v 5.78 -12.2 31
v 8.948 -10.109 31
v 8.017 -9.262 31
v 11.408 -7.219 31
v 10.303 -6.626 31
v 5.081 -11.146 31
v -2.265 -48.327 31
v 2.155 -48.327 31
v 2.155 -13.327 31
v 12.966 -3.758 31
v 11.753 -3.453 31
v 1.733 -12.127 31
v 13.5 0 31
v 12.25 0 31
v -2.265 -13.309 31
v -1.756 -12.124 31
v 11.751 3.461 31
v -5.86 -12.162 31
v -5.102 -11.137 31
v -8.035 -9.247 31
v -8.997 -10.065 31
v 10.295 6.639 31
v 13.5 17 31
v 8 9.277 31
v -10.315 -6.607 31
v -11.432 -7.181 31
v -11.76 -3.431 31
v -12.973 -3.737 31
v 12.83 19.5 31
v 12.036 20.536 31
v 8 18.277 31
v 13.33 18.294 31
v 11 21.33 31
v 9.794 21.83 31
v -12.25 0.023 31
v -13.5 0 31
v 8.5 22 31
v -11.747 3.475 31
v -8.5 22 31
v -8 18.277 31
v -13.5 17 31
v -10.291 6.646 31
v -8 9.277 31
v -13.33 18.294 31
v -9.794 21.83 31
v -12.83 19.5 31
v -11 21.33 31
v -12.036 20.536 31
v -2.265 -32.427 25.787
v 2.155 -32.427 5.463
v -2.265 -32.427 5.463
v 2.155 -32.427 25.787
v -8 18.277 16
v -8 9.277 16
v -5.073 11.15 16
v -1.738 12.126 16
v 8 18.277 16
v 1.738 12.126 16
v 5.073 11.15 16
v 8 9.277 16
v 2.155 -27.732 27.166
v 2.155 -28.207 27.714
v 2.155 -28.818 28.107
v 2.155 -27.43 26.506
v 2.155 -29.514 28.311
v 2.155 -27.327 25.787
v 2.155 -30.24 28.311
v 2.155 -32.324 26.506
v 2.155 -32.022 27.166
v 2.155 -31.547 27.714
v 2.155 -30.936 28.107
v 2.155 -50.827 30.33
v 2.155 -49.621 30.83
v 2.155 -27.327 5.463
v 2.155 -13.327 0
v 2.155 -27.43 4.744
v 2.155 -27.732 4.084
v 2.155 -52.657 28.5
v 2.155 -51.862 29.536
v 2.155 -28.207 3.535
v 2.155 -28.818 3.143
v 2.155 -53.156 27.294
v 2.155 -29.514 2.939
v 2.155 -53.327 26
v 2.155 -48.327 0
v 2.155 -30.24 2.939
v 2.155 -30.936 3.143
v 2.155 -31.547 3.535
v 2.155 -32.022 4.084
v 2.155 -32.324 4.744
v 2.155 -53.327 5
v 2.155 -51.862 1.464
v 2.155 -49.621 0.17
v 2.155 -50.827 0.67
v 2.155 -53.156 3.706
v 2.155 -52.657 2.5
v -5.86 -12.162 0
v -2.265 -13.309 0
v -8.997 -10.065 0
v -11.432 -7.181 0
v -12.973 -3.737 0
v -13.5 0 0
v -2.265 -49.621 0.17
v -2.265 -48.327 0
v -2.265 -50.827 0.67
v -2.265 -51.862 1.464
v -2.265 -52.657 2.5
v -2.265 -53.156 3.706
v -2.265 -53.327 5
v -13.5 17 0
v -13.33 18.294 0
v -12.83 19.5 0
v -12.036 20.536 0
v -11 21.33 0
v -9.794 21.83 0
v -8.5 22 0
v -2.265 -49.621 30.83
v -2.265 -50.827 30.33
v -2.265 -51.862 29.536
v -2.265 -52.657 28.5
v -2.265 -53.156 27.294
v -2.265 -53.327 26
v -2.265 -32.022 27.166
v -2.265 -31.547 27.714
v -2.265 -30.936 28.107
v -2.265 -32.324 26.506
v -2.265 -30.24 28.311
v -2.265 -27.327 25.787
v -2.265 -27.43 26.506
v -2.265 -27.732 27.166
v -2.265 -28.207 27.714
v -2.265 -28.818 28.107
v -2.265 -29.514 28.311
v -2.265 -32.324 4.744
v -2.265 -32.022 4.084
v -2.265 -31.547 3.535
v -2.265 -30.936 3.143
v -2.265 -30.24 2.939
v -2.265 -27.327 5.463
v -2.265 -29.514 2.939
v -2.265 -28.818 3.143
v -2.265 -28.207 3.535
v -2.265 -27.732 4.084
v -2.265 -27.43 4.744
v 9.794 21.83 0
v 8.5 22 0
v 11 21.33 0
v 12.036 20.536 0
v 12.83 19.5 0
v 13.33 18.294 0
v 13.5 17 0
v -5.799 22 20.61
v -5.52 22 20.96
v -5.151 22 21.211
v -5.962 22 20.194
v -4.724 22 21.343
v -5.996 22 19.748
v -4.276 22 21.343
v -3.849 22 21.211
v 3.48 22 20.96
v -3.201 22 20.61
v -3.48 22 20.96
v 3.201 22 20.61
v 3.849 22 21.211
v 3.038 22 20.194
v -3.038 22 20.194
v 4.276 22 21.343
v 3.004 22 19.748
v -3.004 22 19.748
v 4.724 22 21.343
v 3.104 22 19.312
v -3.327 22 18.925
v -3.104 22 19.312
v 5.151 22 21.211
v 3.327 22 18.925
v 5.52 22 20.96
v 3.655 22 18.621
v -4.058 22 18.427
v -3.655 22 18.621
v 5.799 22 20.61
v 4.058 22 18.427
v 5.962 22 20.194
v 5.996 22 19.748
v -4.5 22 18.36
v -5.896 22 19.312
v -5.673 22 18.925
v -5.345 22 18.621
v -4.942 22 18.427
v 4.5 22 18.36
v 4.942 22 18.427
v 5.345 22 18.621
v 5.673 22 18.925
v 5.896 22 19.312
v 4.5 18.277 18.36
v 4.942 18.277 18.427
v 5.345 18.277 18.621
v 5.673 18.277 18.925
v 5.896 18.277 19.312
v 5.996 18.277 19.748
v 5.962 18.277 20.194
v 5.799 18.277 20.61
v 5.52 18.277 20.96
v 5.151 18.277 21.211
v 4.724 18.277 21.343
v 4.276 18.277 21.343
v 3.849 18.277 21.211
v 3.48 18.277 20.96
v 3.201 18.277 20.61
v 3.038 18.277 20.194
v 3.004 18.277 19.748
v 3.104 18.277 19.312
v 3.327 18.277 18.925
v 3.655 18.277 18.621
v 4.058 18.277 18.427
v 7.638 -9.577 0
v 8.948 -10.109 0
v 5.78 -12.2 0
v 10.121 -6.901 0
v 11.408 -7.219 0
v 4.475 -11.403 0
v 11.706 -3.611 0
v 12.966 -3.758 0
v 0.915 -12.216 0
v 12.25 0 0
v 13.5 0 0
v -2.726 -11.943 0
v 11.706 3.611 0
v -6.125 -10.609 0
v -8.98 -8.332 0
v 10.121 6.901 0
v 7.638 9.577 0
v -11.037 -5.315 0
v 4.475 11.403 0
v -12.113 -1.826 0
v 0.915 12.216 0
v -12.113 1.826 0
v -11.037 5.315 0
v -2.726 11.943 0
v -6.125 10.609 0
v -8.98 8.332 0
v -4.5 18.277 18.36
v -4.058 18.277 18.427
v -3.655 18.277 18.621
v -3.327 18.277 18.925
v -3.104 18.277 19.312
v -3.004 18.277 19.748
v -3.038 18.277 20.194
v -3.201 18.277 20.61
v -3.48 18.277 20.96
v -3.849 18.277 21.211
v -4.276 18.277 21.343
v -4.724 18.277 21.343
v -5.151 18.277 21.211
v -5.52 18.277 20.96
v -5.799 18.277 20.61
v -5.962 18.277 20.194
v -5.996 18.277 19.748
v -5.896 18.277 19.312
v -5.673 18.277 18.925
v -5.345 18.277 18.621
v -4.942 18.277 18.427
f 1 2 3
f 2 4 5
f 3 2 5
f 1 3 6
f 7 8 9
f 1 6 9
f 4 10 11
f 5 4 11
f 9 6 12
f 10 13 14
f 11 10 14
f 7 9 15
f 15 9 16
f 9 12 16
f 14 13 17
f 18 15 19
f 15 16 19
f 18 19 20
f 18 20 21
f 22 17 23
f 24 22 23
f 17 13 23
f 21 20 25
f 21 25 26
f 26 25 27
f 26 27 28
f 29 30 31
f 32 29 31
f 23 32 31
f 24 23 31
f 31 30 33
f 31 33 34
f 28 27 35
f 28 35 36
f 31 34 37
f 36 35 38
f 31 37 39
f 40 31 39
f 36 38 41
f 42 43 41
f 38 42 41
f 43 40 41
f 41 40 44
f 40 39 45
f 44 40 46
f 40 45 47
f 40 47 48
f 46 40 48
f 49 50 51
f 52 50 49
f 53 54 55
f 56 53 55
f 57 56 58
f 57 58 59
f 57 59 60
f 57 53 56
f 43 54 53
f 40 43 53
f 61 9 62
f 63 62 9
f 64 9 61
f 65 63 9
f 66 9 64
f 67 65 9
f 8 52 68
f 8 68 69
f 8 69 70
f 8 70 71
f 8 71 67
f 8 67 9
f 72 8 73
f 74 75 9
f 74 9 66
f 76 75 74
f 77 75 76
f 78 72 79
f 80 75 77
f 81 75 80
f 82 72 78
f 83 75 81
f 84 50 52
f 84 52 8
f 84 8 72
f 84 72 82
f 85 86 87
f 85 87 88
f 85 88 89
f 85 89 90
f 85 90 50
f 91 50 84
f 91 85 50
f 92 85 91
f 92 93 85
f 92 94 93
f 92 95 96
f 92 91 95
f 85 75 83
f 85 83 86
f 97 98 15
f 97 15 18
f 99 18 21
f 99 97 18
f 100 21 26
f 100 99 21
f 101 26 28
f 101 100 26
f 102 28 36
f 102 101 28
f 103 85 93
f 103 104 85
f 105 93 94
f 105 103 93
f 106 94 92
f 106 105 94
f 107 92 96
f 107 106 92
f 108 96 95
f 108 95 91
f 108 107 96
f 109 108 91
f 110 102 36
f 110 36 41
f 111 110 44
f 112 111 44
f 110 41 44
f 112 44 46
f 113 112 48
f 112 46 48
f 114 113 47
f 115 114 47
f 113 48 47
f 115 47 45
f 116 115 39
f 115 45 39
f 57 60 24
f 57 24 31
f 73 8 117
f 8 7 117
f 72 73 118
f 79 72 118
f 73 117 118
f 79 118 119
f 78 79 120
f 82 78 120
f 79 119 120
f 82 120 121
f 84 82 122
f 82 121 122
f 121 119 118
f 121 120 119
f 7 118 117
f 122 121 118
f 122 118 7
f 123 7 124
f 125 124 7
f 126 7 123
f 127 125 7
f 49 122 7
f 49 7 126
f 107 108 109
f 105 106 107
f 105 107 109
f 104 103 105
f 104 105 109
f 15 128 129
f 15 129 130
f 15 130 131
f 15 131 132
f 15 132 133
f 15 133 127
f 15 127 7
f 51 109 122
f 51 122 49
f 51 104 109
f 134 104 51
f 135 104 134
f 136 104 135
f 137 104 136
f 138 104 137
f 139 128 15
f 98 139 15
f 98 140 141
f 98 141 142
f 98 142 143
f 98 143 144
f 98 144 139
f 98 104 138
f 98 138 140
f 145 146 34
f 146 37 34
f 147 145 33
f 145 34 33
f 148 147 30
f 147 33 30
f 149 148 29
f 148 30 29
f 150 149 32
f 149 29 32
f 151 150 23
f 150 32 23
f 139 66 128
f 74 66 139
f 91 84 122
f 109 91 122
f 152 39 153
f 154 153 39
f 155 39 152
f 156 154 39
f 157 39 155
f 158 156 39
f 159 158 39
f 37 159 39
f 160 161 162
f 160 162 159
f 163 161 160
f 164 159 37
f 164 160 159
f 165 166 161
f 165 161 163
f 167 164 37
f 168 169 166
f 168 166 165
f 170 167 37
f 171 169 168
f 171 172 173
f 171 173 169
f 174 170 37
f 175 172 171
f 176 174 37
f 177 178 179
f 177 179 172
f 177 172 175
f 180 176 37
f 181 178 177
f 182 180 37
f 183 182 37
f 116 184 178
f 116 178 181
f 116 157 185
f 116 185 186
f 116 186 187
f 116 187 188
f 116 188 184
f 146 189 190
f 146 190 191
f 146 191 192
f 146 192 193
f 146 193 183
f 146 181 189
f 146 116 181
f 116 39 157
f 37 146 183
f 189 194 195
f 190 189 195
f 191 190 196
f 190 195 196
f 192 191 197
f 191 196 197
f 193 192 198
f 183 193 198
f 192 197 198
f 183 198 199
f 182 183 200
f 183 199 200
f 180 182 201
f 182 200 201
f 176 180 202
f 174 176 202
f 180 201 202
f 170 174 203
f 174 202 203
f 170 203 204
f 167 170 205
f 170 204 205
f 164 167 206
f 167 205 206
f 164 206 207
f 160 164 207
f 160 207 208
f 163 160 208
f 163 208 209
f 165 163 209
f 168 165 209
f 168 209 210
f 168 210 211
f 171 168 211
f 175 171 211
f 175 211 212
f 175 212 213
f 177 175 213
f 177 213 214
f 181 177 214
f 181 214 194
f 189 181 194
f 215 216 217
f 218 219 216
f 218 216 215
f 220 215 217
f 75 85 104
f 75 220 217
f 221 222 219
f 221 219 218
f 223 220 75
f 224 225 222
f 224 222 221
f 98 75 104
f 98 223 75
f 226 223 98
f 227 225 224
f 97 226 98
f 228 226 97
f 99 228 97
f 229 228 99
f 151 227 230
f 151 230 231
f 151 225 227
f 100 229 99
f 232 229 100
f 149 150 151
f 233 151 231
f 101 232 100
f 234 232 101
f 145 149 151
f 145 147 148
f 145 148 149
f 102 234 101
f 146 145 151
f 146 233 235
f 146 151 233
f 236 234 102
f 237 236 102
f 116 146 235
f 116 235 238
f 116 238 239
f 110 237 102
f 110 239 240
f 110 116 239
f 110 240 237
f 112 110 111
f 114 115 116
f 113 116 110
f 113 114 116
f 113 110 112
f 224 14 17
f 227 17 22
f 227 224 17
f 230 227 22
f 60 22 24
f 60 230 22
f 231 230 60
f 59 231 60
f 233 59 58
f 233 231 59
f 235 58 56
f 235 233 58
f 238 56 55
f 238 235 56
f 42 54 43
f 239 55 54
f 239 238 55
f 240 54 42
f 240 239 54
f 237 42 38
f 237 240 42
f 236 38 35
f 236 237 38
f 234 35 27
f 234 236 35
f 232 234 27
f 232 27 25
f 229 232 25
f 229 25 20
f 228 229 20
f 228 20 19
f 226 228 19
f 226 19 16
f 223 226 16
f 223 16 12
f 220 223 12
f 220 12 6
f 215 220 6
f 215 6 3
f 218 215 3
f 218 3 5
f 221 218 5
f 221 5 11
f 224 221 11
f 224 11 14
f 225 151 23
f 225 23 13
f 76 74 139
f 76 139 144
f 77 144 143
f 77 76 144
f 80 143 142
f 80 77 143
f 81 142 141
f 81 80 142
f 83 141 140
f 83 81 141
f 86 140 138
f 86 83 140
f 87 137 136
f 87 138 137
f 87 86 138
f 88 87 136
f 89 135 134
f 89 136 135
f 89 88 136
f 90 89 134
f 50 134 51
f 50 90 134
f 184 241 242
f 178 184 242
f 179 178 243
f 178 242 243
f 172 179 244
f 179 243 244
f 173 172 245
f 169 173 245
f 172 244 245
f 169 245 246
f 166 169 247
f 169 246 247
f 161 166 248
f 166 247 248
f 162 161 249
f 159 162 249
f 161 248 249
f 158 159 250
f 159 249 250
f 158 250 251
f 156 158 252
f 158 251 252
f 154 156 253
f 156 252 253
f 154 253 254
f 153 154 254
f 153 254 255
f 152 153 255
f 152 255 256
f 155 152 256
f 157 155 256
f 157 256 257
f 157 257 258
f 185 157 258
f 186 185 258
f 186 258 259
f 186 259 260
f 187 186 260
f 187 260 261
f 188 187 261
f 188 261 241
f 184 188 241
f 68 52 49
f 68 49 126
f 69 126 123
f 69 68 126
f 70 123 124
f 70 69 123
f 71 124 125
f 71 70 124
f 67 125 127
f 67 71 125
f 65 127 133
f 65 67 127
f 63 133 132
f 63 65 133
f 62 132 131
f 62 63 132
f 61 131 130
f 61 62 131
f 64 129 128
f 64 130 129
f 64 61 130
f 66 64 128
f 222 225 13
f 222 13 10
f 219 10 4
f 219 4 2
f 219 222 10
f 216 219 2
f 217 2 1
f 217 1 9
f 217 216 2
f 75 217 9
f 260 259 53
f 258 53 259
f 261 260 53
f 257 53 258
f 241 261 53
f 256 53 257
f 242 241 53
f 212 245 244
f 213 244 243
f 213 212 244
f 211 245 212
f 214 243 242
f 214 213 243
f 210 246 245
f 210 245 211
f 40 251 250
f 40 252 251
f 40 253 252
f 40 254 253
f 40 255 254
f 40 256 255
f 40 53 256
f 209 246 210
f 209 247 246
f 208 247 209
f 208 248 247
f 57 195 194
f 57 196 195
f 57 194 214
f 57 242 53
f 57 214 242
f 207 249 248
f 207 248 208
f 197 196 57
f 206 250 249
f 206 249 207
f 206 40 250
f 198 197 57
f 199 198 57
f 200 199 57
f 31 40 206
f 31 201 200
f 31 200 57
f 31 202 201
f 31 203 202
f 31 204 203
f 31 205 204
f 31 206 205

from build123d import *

# Parameters (mm, degrees)
SKETCH1_R           = 12.25
BOSS_EXTRUDE2_DEPTH = 31
SKETCH2_W           = 16
SKETCH2_H           = 9
CUT_EXTRUDE1_DEPTH  = 15
SKETCH3_R           = 1.5
CUT_EXTRUDE2_DEPTH  = 15
CUT_EXTRUDE3_DEPTH  = 15
FILLET1_R           = 5


with BuildPart() as part:
    # Sketch1 → Boss-Extrude2 (new body)
    with BuildSketch(Plane.XY):
        with BuildLine():
            Line((-13.5, 0), (-13.5, 22))
            Line((-13.5, 22), (13.5, 22))
            Line((13.5, 22), (13.5, 0))
            ThreePointArc((13.5, 0), (10.279789156, -8.750767675), (2.155417052, -13.326821727))
            Line((2.155417052, -13.326821727), (2.155417052, -53.326821727))
            Line((2.155417052, -53.326821727), (-2.26470283, -53.326821727))
            Line((-2.26470283, -53.326821727), (-2.26470283, -13.308685927))
            ThreePointArc((-2.26470283, -13.308685927), (-10.315606822, -8.708516286), (-13.5, 0))
        make_face()
        Circle(SKETCH1_R, mode=Mode.SUBTRACT)
    extrude(amount=BOSS_EXTRUDE2_DEPTH)

    # Sketch2 → Cut-Extrude1 (cut)
    with BuildSketch(Plane.XY.offset(31)):
        with Locations((0, 13.776987658)):
            Rectangle(SKETCH2_W, SKETCH2_H)
    extrude(amount=-CUT_EXTRUDE1_DEPTH, mode=Mode.SUBTRACT)

    # Sketch3 → Cut-Extrude2 (cut)
    with BuildSketch(Plane.XZ.offset(-18.276987658)):
        with Locations(Location((-4.5, 19.859972316, 0), (0, 0, 270))):
            Circle(SKETCH3_R)
        with Locations(Location((4.5, 19.859972316, 0), (0, 0, 270))):
            Circle(SKETCH3_R)
    extrude(amount=-CUT_EXTRUDE2_DEPTH, mode=Mode.SUBTRACT)

    # Sketch4 → Cut-Extrude3 (cut)
    with BuildSketch(Plane(origin=(2.155417052, 0, 0), x_dir=(0, 0, -1), z_dir=(1, 0, 0))):
        with BuildLine():
            Line((-25.787321286, -27.326821727), (-5.462583223, -27.326821727))
            ThreePointArc((-5.462583223, -27.326821727), (-2.912583223, -29.876821727), (-5.462583223, -32.426821727))
            Line((-5.462583223, -32.426821727), (-25.787321286, -32.426821727))
            ThreePointArc((-25.787321286, -32.426821727), (-28.337321286, -29.876821727), (-25.787321286, -27.326821727))
        make_face()
    extrude(amount=-CUT_EXTRUDE3_DEPTH, mode=Mode.SUBTRACT)

    # Fillet1
    fillet1_edges = [part.edges().sort_by_distance(p)[0] for p in [
        (-0.054642889, -53.326821727, 0),
        (-0.054642889, -53.326821727, 31),
        (-13.5, 22, 15.5),
        (13.5, 22, 15.5),
    ]]
    fillet(fillet1_edges, radius=FILLET1_R)


solid = part.part
